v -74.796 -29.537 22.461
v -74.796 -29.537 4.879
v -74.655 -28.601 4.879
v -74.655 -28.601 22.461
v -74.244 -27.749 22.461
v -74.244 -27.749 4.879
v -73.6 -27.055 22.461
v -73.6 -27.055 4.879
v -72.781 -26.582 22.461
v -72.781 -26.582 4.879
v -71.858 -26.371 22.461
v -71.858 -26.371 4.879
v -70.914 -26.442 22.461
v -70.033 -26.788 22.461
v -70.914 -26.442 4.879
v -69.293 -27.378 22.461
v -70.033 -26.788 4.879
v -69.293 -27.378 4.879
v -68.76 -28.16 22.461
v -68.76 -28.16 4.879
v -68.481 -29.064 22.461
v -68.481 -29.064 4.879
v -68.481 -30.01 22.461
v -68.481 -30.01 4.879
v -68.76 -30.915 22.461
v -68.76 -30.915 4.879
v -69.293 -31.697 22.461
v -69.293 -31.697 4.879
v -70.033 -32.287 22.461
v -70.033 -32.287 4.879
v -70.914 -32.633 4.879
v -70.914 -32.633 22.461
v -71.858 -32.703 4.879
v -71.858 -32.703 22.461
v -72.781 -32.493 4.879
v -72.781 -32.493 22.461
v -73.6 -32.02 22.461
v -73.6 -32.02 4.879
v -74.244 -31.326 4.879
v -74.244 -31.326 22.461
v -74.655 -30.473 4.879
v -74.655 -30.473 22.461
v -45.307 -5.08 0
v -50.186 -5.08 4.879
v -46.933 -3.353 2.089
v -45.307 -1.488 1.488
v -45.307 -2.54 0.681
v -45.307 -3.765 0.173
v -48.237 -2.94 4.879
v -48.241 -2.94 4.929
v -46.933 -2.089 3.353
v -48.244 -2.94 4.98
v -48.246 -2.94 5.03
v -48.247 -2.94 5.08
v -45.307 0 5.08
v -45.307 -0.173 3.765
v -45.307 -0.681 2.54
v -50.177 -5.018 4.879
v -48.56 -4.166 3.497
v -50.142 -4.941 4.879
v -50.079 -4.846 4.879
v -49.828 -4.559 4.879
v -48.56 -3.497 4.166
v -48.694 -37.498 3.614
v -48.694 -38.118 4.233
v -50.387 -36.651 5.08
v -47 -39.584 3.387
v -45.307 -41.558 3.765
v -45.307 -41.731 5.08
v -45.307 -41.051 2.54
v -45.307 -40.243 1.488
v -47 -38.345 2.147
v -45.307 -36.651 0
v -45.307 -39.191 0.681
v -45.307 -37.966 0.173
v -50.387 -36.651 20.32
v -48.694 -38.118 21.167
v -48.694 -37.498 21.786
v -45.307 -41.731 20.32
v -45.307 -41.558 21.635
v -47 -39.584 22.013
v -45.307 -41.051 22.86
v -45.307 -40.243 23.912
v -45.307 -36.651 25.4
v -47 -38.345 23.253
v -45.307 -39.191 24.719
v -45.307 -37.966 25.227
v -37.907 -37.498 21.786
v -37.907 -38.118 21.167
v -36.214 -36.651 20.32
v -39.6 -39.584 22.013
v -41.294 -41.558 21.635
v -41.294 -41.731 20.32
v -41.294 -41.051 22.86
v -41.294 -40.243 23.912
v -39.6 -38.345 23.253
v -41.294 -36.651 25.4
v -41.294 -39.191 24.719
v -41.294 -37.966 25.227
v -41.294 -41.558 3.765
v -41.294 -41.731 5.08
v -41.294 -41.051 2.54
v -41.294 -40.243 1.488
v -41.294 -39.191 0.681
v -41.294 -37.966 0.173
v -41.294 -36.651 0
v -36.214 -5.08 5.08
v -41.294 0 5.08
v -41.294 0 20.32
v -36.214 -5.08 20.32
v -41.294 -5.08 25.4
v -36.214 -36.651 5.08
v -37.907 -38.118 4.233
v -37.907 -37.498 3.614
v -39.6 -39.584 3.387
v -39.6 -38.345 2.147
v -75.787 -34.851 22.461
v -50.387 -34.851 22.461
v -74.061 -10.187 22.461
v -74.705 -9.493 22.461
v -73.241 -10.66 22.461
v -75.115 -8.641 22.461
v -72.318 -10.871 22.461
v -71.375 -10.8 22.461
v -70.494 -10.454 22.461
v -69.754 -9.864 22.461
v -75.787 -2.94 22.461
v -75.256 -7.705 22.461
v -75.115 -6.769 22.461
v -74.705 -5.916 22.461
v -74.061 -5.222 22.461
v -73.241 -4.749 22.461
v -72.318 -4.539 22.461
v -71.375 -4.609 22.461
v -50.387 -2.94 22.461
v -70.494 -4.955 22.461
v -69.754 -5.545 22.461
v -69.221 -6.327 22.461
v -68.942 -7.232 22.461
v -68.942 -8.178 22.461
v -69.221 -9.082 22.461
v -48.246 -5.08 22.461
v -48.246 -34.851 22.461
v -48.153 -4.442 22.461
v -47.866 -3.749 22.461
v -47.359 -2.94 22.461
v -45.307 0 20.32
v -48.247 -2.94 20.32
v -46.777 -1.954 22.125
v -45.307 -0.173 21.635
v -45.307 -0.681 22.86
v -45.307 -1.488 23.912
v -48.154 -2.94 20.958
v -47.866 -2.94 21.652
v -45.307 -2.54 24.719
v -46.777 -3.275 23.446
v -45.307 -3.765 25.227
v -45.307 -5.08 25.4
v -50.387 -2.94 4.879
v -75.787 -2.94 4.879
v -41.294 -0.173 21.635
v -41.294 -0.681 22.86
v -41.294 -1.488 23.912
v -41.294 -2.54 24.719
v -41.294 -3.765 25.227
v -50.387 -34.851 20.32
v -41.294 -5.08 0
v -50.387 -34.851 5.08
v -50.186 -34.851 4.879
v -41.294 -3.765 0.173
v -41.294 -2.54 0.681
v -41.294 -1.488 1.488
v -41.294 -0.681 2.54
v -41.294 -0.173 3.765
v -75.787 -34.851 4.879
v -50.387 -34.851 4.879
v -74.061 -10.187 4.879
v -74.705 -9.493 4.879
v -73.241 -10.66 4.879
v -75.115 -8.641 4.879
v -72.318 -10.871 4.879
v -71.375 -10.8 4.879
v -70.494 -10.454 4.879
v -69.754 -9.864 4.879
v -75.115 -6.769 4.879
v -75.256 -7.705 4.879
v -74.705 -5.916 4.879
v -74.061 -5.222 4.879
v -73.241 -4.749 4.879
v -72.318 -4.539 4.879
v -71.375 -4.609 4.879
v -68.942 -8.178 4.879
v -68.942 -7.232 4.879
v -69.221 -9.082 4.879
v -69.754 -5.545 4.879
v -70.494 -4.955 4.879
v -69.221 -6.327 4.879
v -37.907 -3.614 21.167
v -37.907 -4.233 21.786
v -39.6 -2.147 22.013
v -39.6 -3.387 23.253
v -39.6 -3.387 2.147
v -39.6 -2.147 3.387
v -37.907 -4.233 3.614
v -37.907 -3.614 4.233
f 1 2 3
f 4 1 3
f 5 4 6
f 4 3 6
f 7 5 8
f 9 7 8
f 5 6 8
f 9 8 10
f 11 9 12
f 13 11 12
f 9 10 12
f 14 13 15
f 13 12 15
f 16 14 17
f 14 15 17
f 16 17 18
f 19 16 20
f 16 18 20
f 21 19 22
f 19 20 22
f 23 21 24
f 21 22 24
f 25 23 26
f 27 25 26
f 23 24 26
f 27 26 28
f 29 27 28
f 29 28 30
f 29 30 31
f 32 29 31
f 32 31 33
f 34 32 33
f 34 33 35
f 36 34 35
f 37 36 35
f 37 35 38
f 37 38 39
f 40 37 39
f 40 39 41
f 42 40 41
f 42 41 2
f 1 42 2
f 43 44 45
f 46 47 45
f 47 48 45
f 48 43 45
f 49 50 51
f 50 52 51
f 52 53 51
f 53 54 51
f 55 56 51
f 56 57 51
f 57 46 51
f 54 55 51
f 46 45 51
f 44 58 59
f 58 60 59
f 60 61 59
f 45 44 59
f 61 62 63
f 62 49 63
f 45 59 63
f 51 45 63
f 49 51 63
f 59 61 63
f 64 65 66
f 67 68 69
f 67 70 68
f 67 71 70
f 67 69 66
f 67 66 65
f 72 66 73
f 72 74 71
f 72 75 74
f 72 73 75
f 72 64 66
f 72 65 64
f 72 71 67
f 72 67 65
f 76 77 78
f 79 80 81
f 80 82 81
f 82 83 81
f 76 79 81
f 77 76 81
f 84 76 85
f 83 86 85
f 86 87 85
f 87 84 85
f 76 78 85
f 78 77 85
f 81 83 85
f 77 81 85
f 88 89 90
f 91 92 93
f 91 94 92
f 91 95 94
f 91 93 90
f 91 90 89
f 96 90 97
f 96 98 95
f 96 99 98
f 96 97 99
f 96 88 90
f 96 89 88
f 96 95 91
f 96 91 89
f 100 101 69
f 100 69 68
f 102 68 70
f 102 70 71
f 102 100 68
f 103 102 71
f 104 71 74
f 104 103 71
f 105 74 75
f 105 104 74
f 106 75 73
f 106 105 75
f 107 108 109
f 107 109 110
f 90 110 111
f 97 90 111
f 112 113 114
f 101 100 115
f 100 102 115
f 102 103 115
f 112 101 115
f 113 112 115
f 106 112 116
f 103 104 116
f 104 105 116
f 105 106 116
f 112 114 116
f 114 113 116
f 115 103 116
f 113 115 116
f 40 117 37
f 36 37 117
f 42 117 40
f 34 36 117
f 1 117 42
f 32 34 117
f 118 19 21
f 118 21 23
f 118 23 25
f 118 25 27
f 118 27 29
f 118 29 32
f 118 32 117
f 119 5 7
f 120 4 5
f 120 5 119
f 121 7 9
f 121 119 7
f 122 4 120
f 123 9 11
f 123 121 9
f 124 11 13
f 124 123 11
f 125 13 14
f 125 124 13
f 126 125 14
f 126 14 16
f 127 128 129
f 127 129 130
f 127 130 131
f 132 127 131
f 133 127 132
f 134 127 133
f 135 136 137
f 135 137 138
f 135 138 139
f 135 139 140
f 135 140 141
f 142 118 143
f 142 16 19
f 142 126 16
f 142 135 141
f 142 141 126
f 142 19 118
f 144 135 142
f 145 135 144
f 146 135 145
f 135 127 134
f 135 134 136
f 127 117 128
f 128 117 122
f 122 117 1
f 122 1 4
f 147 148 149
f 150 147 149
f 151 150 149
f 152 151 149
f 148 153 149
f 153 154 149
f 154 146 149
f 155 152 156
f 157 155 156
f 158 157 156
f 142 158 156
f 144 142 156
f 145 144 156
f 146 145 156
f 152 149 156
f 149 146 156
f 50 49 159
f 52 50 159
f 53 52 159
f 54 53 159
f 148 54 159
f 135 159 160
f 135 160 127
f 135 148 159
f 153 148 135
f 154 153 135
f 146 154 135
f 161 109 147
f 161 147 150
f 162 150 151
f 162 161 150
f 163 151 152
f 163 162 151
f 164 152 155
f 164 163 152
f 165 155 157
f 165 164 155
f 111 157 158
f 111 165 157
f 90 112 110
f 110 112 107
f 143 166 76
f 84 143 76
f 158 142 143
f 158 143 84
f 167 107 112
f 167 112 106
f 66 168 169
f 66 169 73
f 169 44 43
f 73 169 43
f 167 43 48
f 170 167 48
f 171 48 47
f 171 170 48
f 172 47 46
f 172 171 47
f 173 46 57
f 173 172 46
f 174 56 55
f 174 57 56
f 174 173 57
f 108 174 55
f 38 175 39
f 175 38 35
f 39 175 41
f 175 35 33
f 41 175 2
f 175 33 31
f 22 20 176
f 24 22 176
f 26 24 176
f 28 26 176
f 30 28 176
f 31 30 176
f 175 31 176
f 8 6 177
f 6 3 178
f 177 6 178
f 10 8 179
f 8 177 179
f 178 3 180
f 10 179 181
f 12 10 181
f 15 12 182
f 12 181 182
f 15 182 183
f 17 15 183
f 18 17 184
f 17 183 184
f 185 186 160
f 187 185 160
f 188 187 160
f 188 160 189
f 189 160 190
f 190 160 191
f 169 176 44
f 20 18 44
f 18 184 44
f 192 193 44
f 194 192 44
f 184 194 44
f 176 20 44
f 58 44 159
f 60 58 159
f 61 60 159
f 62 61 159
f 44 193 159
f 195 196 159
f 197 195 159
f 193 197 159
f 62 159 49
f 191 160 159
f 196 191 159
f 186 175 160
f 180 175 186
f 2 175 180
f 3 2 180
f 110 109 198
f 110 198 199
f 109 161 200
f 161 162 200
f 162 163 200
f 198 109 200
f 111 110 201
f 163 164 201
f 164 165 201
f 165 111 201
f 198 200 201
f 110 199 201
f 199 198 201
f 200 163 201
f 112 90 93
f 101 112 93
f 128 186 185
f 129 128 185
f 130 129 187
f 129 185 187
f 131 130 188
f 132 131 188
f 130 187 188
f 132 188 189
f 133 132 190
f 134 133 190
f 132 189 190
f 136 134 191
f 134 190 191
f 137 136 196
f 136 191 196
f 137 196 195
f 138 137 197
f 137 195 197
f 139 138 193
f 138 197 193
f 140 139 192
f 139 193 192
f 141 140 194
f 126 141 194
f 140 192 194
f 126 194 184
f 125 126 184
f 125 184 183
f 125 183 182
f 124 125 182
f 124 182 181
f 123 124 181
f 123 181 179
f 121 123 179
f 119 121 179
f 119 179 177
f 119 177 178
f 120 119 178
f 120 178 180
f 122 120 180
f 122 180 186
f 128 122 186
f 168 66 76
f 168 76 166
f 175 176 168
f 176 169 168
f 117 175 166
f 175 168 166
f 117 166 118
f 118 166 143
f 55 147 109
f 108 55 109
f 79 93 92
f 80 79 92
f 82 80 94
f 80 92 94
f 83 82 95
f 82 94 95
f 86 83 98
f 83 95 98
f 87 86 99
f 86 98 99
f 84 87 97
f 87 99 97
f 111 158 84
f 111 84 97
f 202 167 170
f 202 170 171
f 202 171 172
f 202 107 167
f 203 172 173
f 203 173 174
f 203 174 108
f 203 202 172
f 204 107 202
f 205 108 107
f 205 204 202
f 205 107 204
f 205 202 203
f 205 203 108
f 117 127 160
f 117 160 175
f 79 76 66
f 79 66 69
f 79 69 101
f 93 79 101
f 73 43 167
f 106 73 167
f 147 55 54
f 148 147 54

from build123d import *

# Parameters (mm, degrees)
F0_W          = 14.1733624041
F0_H          = 41.7313948274
F1_DEPTH      = 25.4
F2_R          = 5.08
F3_R          = 5.08
F4_R          = 5.08
F5_R          = 5.08
F6_W          = 31.9113396108
F6_H          = 17.5824901089
F7_DEPTH      = 12.7
F8_DEPTH      = 25.4
F10_D         = 6.35
F11_D         = 6.35
F12_T1_DEPTH  = 15.24
F12_T3_DEPTH  = 31.5713948274
F12_T6_ANGLE  = 90
F12_T8_ANGLE  = 90
F12_T10_ANGLE = 90
F12_T12_ANGLE = 90
F12_T14_ANGLE = 90
F12_T18_DEPTH = 31.5713948274
F12_T24_DEPTH = 31.5713948274
F12_T30_DEPTH = 31.5713948274
F12_T36_ANGLE = 90
F12_T42_ANGLE = 90
F12_T48_ANGLE = 90
F12_T54_DEPTH = 15.24
F12_T59_ANGLE = 90
F12_T65_ANGLE = 90
F12_T71_ANGLE = 90
F12_T77_DEPTH = 31.5713948274
F12_T83_DEPTH = 31.5713948274
F12_T89_DEPTH = 31.5713948274
F12_T93_ANGLE = 90


# Not quite as in the source:
# - a fillet or chamfer that OpenCascade refuses, or shapes differently, is made with other operations: its cross-section is extruded or revolved along the edge and cut away or added


with BuildPart() as f1:
    # F0 (on Top) → F1 (new body)
    with BuildSketch(Plane.XY):
        with Locations((-43.3002728969, -20.8656974137)):
            Rectangle(F0_W, F0_H)
    extrude(amount=F1_DEPTH)

    # F2
    f2_edges = [f1.edges().sort_by_distance(p)[0] for p in [
        (-43.300273, -41.731395, 25.4),
    ]]
    fillet(f2_edges, radius=F2_R)

    # F3
    f3_edges = [f1.edges().sort_by_distance(p)[0] for p in [
        (-43.300273, -41.731395, 0),
    ]]
    fillet(f3_edges, radius=F3_R)

    # F4
    f4_edges = [f1.edges().sort_by_distance(p)[0] for p in [
        (-43.300273, 0, 0),
    ]]
    fillet(f4_edges, radius=F4_R)

    # F5
    f5_edges = [f1.edges().sort_by_distance(p)[0] for p in [
        (-43.300273, 0, 25.4),
    ]]
    fillet(f5_edges, radius=F5_R)

    # F1_face (on face) + F6 (on face) → F7 (join)
    with BuildSketch(Plane(origin=(-50.3869540989, -20.8656974137, 12.7), x_dir=(0, -1, 0), z_dir=(-1, 0, 0))):
        with BuildLine():
            Line((-20.8656974137, 7.62), (-20.8656974137, -7.62))
            ThreePointArc((-20.8656974137, -7.62), (-19.3777998621, -11.2121024484), (-15.7856974137, -12.7))
            Line((-15.7856974137, -12.7), (15.7856974137, -12.7))
            ThreePointArc((15.7856974137, -12.7), (19.3777998621, -11.2121024484), (20.8656974137, -7.62))
            Line((20.8656974137, -7.62), (20.8656974137, 7.62))
            ThreePointArc((20.8656974137, 7.62), (19.3777998621, 11.2121024484), (15.7856974137, 12.7))
            Line((15.7856974137, 12.7), (-15.7856974137, 12.7))
            ThreePointArc((-15.7856974137, 12.7), (-19.3777998621, 11.2121024484), (-20.8656974137, 7.62))
        make_face()
    with BuildSketch(Plane(origin=(-50.3869540989, 0, 0), x_dir=(0, -1, 0), z_dir=(-1, 0, 0))):
        with Locations((18.8954193145, 13.6700686999)):
            Rectangle(F6_W, F6_H)
    extrude(amount=-F7_DEPTH)

    # F6 (on face) → F8 (join)
    with BuildSketch(Plane(origin=(-50.3869540989, 0, 0), x_dir=(0, -1, 0), z_dir=(-1, 0, 0))):
        with Locations((18.8954193145, 13.6700686999)):
            Rectangle(F6_W, F6_H)
    extrude(amount=F8_DEPTH)

    # F10 (through all)
    with Locations(Plane.XY.offset(22.4613137543)):
        with Locations((-71.6206654906, -29.537204653)):
            Hole(F10_D / 2)

    # F11 (through all)
    with Locations(Plane.XY.offset(22.4613137543)):
        with Locations((-72.0812156796, -7.7047413215)):
            Hole(F11_D / 2)

    # F12: chamfer of 5.08 on 4 edges, made by hand

    # F12_s2 → F12_t1 (cut)
    with BuildSketch(Plane.XY.offset(5.08)):
        Polygon((-36.2135916948, -36.6513948274), (-41.2935916948, -41.7313948274), (-36.2135916948, -41.7313948274), align=None)
        Polygon((-41.2935916948, 0), (-36.2135916948, -5.08), (-36.2135916948, 0), align=None)
        Polygon((-50.3869540989, -36.6513948274), (-45.3069540989, -41.7313948274), (-50.3869540989, -41.7313948274), align=None)
    extrude(amount=F12_T1_DEPTH, mode=Mode.SUBTRACT)

    # F12_s4 → F12_t3 (cut)
    with BuildSketch(Plane.XZ.offset(5.08)):
        Polygon((-36.2135916948, 20.32), (-41.2935916948, 25.4), (-36.2135916948, 25.4), align=None)
        Polygon((-36.2135916948, 5.08), (-41.2935916948, 0), (-36.2135916948, 0), align=None)
    extrude(amount=F12_T3_DEPTH, mode=Mode.SUBTRACT)

    # F12_s5 → F12_t6 (revolve, cut)
    with BuildSketch(Plane.XY.offset(20.32)):
        Polygon((-50.3869540989, -36.6513948274), (-45.3069540989, -41.7313948274), (-50.3869540989, -41.7313948274), align=None)
    revolve(axis=Axis((-50.3869540989, -36.6513948274, 20.32), (-1, 0, 0)), revolution_arc=F12_T6_ANGLE, mode=Mode.SUBTRACT)

    # F12_s7 → F12_t8 (revolve, cut)
    with BuildSketch(Plane.XY.offset(20.32)):
        Polygon((-36.2135916948, -36.6513948274), (-41.2935916948, -41.7313948274), (-36.2135916948, -41.7313948274), align=None)
    revolve(axis=Axis((-36.2135916948, -36.6513948274, 20.32), (-1, 0, 0)), revolution_arc=F12_T8_ANGLE, mode=Mode.SUBTRACT)

    # F12_s9 → F12_t10 (revolve, cut)
    with BuildSketch(Plane.XY.offset(20.32)):
        Polygon((-36.2135916948, -5.08), (-41.2935916948, 0), (-36.2135916948, 0), align=None)
    revolve(axis=Axis((-36.2135916948, -5.08, 20.32), (1, 0, 0)), revolution_arc=F12_T10_ANGLE, mode=Mode.SUBTRACT)

    # F12_s11 → F12_t12 (revolve, cut)
    with BuildSketch(Plane.XZ.offset(5.08)):
        Polygon((-41.2935916948, 0), (-36.2135916948, 5.08), (-36.2135916948, 0), align=None)
    revolve(axis=Axis((-36.2135916948, -5.08, 5.08), (1, 0, 0)), revolution_arc=F12_T12_ANGLE, mode=Mode.SUBTRACT)

    # F12_s13 → F12_t14 (revolve, cut)
    with BuildSketch(Plane.XY.offset(5.08)):
        Polygon((-36.2135916948, -36.6513948274), (-41.2935916948, -41.7313948274), (-36.2135916948, -41.7313948274), align=None)
    revolve(axis=Axis((-36.2135916948, -36.6513948274, 5.08), (1, 0, 0)), revolution_arc=F12_T14_ANGLE, mode=Mode.SUBTRACT)


with BuildPart() as f12_tool16:
    # F12_s17 → F12_t18 (new body)
    with BuildSketch(Plane.XZ.offset(5.08)):
        Polygon((-50.3869540989, 20.32), (-45.3069540989, 25.4), (-50.3869540989, 25.4), align=None)
    extrude(amount=F12_T18_DEPTH)

    split(bisect_by=Plane.XY.offset(22.4613137543), keep=Keep.TOP)

    split(bisect_by=Plane.XZ.offset(34.8510891199), keep=Keep.BOTTOM)


with BuildPart() as f1_1:
    add(f1.part)

    # F12_t15: cut F12_tool16
    add(f12_tool16.part, mode=Mode.SUBTRACT)


with BuildPart() as f12_tool22:
    # F12_s23 → F12_t24 (new body)
    with BuildSketch(Plane.XZ.offset(5.08)):
        Polygon((-50.3869540989, 20.32), (-45.3069540989, 25.4), (-50.3869540989, 25.4), align=None)
    extrude(amount=F12_T24_DEPTH)

    split(bisect_by=Plane.XY.offset(22.4613137543), keep=Keep.BOTTOM)

    split(bisect_by=Plane.XZ.offset(34.8510891199), keep=Keep.TOP)


with BuildPart() as f1_2:
    add(f1_1.part)

    # F12_t21: cut F12_tool22
    add(f12_tool22.part, mode=Mode.SUBTRACT)


with BuildPart() as f12_tool28:
    # F12_s29 → F12_t30 (new body)
    with BuildSketch(Plane.XZ.offset(5.08)):
        Polygon((-50.3869540989, 20.32), (-45.3069540989, 25.4), (-50.3869540989, 25.4), align=None)
    extrude(amount=F12_T30_DEPTH)

    split(bisect_by=Plane.XY.offset(22.4613137543), keep=Keep.TOP)

    split(bisect_by=Plane.XZ.offset(34.8510891199), keep=Keep.TOP)


with BuildPart() as f1_3:
    add(f1_2.part)

    # F12_t27: cut F12_tool28
    add(f12_tool28.part, mode=Mode.SUBTRACT)


with BuildPart() as f12_tool34:
    # F12_s35 → F12_t36 (revolve)
    with BuildSketch(Plane.XY.offset(20.32)):
        Polygon((-45.3069540989, 0), (-50.3869540989, -5.08), (-50.3869540989, 0), align=None)
    revolve(axis=Axis((-50.3869540989, -5.08, 20.32), (1, 0, 0)), revolution_arc=F12_T36_ANGLE)

    split(bisect_by=Plane.XZ.offset(2.9397495091), keep=Keep.BOTTOM)

    split(bisect_by=Plane.XY.offset(22.4613137543), keep=Keep.BOTTOM)


with BuildPart() as f1_4:
    add(f1_3.part)

    # F12_t33: cut F12_tool34
    add(f12_tool34.part, mode=Mode.SUBTRACT)


with BuildPart() as f12_tool40:
    # F12_s41 → F12_t42 (revolve)
    with BuildSketch(Plane.XY.offset(20.32)):
        Polygon((-45.3069540989, 0), (-50.3869540989, -5.08), (-50.3869540989, 0), align=None)
    revolve(axis=Axis((-50.3869540989, -5.08, 20.32), (1, 0, 0)), revolution_arc=F12_T42_ANGLE)

    split(bisect_by=Plane.XZ.offset(2.9397495091), keep=Keep.BOTTOM)

    split(bisect_by=Plane.XY.offset(22.4613137543), keep=Keep.TOP)


with BuildPart() as f1_5:
    add(f1_4.part)

    # F12_t39: cut F12_tool40
    add(f12_tool40.part, mode=Mode.SUBTRACT)


with BuildPart() as f12_tool46:
    # F12_s47 → F12_t48 (revolve)
    with BuildSketch(Plane.XY.offset(20.32)):
        Polygon((-45.3069540989, 0), (-50.3869540989, -5.08), (-50.3869540989, 0), align=None)
    revolve(axis=Axis((-50.3869540989, -5.08, 20.32), (1, 0, 0)), revolution_arc=F12_T48_ANGLE)

    split(bisect_by=Plane.XZ.offset(2.9397495091), keep=Keep.TOP)

    split(bisect_by=Plane.XY.offset(22.4613137543), keep=Keep.TOP)


with BuildPart() as f1_6:
    add(f1_5.part)

    # F12_t45: cut F12_tool46
    add(f12_tool46.part, mode=Mode.SUBTRACT)


with BuildPart() as f12_tool52:
    # F12_s53 → F12_t54 (new body)
    with BuildSketch(Plane.XY.offset(5.08)):
        Polygon((-45.3069540989, 0), (-50.3869540989, -5.08), (-50.3869540989, 0), align=None)
    extrude(amount=F12_T54_DEPTH)

    split(bisect_by=Plane.XZ.offset(2.9397495091), keep=Keep.BOTTOM)


with BuildPart() as f1_7:
    add(f1_6.part)

    # F12_t51: cut F12_tool52
    add(f12_tool52.part, mode=Mode.SUBTRACT)


with BuildPart() as f12_tool57:
    # F12_s58 → F12_t59 (revolve)
    with BuildSketch(Plane.XZ.offset(5.08)):
        Polygon((-45.3069540989, 0), (-50.3869540989, 5.08), (-50.3869540989, 0), align=None)
    revolve(axis=Axis((-50.3869540989, -5.08, 5.08), (1, 0, 0)), revolution_arc=F12_T59_ANGLE)

    split(bisect_by=Plane.XZ.offset(2.9397495091), keep=Keep.TOP)

    split(bisect_by=Plane.XY.offset(4.8788236454), keep=Keep.BOTTOM)


with BuildPart() as f1_8:
    add(f1_7.part)

    # F12_t56: cut F12_tool57
    add(f12_tool57.part, mode=Mode.SUBTRACT)


with BuildPart() as f12_tool63:
    # F12_s64 → F12_t65 (revolve)
    with BuildSketch(Plane.XZ.offset(5.08)):
        Polygon((-45.3069540989, 0), (-50.3869540989, 5.08), (-50.3869540989, 0), align=None)
    revolve(axis=Axis((-50.3869540989, -5.08, 5.08), (1, 0, 0)), revolution_arc=F12_T65_ANGLE)

    split(bisect_by=Plane.XZ.offset(2.9397495091), keep=Keep.BOTTOM)

    split(bisect_by=Plane.XY.offset(4.8788236454), keep=Keep.BOTTOM)


with BuildPart() as f1_9:
    add(f1_8.part)

    # F12_t62: cut F12_tool63
    add(f12_tool63.part, mode=Mode.SUBTRACT)


with BuildPart() as f12_tool69:
    # F12_s70 → F12_t71 (revolve)
    with BuildSketch(Plane.XZ.offset(5.08)):
        Polygon((-45.3069540989, 0), (-50.3869540989, 5.08), (-50.3869540989, 0), align=None)
    revolve(axis=Axis((-50.3869540989, -5.08, 5.08), (1, 0, 0)), revolution_arc=F12_T71_ANGLE)

    split(bisect_by=Plane.XZ.offset(2.9397495091), keep=Keep.BOTTOM)

    split(bisect_by=Plane.XY.offset(4.8788236454), keep=Keep.TOP)


with BuildPart() as f1_10:
    add(f1_9.part)

    # F12_t68: cut F12_tool69
    add(f12_tool69.part, mode=Mode.SUBTRACT)


with BuildPart() as f12_tool75:
    # F12_s76 → F12_t77 (new body)
    with BuildSketch(Plane.XZ.offset(5.08)):
        Polygon((-50.3869540989, 5.08), (-45.3069540989, 0), (-50.3869540989, 0), align=None)
    extrude(amount=F12_T77_DEPTH)

    split(bisect_by=Plane.XZ.offset(34.8510891199), keep=Keep.BOTTOM)

    split(bisect_by=Plane.XY.offset(4.8788236454), keep=Keep.BOTTOM)


with BuildPart() as f1_11:
    add(f1_10.part)

    # F12_t74: cut F12_tool75
    add(f12_tool75.part, mode=Mode.SUBTRACT)


with BuildPart() as f12_tool81:
    # F12_s82 → F12_t83 (new body)
    with BuildSketch(Plane.XZ.offset(5.08)):
        Polygon((-50.3869540989, 5.08), (-45.3069540989, 0), (-50.3869540989, 0), align=None)
    extrude(amount=F12_T83_DEPTH)

    split(bisect_by=Plane.XZ.offset(34.8510891199), keep=Keep.TOP)

    split(bisect_by=Plane.XY.offset(4.8788236454), keep=Keep.TOP)


with BuildPart() as f1_12:
    add(f1_11.part)

    # F12_t80: cut F12_tool81
    add(f12_tool81.part, mode=Mode.SUBTRACT)


with BuildPart() as f12_tool87:
    # F12_s88 → F12_t89 (new body)
    with BuildSketch(Plane.XZ.offset(5.08)):
        Polygon((-50.3869540989, 5.08), (-45.3069540989, 0), (-50.3869540989, 0), align=None)
    extrude(amount=F12_T89_DEPTH)

    split(bisect_by=Plane.XZ.offset(34.8510891199), keep=Keep.TOP)

    split(bisect_by=Plane.XY.offset(4.8788236454), keep=Keep.BOTTOM)


with BuildPart() as f1_13:
    add(f1_12.part)

    # F12_t86: cut F12_tool87
    add(f12_tool87.part, mode=Mode.SUBTRACT)

    # F12_s92 → F12_t93 (revolve, cut)
    with BuildSketch(Plane.XY.offset(5.08)):
        Polygon((-50.3869540989, -36.6513948274), (-45.3069540989, -41.7313948274), (-50.3869540989, -41.7313948274), align=None)
    revolve(axis=Axis((-50.3869540989, -36.6513948274, 5.08), (1, 0, 0)), revolution_arc=F12_T93_ANGLE, mode=Mode.SUBTRACT)


solid = f1_13.part
